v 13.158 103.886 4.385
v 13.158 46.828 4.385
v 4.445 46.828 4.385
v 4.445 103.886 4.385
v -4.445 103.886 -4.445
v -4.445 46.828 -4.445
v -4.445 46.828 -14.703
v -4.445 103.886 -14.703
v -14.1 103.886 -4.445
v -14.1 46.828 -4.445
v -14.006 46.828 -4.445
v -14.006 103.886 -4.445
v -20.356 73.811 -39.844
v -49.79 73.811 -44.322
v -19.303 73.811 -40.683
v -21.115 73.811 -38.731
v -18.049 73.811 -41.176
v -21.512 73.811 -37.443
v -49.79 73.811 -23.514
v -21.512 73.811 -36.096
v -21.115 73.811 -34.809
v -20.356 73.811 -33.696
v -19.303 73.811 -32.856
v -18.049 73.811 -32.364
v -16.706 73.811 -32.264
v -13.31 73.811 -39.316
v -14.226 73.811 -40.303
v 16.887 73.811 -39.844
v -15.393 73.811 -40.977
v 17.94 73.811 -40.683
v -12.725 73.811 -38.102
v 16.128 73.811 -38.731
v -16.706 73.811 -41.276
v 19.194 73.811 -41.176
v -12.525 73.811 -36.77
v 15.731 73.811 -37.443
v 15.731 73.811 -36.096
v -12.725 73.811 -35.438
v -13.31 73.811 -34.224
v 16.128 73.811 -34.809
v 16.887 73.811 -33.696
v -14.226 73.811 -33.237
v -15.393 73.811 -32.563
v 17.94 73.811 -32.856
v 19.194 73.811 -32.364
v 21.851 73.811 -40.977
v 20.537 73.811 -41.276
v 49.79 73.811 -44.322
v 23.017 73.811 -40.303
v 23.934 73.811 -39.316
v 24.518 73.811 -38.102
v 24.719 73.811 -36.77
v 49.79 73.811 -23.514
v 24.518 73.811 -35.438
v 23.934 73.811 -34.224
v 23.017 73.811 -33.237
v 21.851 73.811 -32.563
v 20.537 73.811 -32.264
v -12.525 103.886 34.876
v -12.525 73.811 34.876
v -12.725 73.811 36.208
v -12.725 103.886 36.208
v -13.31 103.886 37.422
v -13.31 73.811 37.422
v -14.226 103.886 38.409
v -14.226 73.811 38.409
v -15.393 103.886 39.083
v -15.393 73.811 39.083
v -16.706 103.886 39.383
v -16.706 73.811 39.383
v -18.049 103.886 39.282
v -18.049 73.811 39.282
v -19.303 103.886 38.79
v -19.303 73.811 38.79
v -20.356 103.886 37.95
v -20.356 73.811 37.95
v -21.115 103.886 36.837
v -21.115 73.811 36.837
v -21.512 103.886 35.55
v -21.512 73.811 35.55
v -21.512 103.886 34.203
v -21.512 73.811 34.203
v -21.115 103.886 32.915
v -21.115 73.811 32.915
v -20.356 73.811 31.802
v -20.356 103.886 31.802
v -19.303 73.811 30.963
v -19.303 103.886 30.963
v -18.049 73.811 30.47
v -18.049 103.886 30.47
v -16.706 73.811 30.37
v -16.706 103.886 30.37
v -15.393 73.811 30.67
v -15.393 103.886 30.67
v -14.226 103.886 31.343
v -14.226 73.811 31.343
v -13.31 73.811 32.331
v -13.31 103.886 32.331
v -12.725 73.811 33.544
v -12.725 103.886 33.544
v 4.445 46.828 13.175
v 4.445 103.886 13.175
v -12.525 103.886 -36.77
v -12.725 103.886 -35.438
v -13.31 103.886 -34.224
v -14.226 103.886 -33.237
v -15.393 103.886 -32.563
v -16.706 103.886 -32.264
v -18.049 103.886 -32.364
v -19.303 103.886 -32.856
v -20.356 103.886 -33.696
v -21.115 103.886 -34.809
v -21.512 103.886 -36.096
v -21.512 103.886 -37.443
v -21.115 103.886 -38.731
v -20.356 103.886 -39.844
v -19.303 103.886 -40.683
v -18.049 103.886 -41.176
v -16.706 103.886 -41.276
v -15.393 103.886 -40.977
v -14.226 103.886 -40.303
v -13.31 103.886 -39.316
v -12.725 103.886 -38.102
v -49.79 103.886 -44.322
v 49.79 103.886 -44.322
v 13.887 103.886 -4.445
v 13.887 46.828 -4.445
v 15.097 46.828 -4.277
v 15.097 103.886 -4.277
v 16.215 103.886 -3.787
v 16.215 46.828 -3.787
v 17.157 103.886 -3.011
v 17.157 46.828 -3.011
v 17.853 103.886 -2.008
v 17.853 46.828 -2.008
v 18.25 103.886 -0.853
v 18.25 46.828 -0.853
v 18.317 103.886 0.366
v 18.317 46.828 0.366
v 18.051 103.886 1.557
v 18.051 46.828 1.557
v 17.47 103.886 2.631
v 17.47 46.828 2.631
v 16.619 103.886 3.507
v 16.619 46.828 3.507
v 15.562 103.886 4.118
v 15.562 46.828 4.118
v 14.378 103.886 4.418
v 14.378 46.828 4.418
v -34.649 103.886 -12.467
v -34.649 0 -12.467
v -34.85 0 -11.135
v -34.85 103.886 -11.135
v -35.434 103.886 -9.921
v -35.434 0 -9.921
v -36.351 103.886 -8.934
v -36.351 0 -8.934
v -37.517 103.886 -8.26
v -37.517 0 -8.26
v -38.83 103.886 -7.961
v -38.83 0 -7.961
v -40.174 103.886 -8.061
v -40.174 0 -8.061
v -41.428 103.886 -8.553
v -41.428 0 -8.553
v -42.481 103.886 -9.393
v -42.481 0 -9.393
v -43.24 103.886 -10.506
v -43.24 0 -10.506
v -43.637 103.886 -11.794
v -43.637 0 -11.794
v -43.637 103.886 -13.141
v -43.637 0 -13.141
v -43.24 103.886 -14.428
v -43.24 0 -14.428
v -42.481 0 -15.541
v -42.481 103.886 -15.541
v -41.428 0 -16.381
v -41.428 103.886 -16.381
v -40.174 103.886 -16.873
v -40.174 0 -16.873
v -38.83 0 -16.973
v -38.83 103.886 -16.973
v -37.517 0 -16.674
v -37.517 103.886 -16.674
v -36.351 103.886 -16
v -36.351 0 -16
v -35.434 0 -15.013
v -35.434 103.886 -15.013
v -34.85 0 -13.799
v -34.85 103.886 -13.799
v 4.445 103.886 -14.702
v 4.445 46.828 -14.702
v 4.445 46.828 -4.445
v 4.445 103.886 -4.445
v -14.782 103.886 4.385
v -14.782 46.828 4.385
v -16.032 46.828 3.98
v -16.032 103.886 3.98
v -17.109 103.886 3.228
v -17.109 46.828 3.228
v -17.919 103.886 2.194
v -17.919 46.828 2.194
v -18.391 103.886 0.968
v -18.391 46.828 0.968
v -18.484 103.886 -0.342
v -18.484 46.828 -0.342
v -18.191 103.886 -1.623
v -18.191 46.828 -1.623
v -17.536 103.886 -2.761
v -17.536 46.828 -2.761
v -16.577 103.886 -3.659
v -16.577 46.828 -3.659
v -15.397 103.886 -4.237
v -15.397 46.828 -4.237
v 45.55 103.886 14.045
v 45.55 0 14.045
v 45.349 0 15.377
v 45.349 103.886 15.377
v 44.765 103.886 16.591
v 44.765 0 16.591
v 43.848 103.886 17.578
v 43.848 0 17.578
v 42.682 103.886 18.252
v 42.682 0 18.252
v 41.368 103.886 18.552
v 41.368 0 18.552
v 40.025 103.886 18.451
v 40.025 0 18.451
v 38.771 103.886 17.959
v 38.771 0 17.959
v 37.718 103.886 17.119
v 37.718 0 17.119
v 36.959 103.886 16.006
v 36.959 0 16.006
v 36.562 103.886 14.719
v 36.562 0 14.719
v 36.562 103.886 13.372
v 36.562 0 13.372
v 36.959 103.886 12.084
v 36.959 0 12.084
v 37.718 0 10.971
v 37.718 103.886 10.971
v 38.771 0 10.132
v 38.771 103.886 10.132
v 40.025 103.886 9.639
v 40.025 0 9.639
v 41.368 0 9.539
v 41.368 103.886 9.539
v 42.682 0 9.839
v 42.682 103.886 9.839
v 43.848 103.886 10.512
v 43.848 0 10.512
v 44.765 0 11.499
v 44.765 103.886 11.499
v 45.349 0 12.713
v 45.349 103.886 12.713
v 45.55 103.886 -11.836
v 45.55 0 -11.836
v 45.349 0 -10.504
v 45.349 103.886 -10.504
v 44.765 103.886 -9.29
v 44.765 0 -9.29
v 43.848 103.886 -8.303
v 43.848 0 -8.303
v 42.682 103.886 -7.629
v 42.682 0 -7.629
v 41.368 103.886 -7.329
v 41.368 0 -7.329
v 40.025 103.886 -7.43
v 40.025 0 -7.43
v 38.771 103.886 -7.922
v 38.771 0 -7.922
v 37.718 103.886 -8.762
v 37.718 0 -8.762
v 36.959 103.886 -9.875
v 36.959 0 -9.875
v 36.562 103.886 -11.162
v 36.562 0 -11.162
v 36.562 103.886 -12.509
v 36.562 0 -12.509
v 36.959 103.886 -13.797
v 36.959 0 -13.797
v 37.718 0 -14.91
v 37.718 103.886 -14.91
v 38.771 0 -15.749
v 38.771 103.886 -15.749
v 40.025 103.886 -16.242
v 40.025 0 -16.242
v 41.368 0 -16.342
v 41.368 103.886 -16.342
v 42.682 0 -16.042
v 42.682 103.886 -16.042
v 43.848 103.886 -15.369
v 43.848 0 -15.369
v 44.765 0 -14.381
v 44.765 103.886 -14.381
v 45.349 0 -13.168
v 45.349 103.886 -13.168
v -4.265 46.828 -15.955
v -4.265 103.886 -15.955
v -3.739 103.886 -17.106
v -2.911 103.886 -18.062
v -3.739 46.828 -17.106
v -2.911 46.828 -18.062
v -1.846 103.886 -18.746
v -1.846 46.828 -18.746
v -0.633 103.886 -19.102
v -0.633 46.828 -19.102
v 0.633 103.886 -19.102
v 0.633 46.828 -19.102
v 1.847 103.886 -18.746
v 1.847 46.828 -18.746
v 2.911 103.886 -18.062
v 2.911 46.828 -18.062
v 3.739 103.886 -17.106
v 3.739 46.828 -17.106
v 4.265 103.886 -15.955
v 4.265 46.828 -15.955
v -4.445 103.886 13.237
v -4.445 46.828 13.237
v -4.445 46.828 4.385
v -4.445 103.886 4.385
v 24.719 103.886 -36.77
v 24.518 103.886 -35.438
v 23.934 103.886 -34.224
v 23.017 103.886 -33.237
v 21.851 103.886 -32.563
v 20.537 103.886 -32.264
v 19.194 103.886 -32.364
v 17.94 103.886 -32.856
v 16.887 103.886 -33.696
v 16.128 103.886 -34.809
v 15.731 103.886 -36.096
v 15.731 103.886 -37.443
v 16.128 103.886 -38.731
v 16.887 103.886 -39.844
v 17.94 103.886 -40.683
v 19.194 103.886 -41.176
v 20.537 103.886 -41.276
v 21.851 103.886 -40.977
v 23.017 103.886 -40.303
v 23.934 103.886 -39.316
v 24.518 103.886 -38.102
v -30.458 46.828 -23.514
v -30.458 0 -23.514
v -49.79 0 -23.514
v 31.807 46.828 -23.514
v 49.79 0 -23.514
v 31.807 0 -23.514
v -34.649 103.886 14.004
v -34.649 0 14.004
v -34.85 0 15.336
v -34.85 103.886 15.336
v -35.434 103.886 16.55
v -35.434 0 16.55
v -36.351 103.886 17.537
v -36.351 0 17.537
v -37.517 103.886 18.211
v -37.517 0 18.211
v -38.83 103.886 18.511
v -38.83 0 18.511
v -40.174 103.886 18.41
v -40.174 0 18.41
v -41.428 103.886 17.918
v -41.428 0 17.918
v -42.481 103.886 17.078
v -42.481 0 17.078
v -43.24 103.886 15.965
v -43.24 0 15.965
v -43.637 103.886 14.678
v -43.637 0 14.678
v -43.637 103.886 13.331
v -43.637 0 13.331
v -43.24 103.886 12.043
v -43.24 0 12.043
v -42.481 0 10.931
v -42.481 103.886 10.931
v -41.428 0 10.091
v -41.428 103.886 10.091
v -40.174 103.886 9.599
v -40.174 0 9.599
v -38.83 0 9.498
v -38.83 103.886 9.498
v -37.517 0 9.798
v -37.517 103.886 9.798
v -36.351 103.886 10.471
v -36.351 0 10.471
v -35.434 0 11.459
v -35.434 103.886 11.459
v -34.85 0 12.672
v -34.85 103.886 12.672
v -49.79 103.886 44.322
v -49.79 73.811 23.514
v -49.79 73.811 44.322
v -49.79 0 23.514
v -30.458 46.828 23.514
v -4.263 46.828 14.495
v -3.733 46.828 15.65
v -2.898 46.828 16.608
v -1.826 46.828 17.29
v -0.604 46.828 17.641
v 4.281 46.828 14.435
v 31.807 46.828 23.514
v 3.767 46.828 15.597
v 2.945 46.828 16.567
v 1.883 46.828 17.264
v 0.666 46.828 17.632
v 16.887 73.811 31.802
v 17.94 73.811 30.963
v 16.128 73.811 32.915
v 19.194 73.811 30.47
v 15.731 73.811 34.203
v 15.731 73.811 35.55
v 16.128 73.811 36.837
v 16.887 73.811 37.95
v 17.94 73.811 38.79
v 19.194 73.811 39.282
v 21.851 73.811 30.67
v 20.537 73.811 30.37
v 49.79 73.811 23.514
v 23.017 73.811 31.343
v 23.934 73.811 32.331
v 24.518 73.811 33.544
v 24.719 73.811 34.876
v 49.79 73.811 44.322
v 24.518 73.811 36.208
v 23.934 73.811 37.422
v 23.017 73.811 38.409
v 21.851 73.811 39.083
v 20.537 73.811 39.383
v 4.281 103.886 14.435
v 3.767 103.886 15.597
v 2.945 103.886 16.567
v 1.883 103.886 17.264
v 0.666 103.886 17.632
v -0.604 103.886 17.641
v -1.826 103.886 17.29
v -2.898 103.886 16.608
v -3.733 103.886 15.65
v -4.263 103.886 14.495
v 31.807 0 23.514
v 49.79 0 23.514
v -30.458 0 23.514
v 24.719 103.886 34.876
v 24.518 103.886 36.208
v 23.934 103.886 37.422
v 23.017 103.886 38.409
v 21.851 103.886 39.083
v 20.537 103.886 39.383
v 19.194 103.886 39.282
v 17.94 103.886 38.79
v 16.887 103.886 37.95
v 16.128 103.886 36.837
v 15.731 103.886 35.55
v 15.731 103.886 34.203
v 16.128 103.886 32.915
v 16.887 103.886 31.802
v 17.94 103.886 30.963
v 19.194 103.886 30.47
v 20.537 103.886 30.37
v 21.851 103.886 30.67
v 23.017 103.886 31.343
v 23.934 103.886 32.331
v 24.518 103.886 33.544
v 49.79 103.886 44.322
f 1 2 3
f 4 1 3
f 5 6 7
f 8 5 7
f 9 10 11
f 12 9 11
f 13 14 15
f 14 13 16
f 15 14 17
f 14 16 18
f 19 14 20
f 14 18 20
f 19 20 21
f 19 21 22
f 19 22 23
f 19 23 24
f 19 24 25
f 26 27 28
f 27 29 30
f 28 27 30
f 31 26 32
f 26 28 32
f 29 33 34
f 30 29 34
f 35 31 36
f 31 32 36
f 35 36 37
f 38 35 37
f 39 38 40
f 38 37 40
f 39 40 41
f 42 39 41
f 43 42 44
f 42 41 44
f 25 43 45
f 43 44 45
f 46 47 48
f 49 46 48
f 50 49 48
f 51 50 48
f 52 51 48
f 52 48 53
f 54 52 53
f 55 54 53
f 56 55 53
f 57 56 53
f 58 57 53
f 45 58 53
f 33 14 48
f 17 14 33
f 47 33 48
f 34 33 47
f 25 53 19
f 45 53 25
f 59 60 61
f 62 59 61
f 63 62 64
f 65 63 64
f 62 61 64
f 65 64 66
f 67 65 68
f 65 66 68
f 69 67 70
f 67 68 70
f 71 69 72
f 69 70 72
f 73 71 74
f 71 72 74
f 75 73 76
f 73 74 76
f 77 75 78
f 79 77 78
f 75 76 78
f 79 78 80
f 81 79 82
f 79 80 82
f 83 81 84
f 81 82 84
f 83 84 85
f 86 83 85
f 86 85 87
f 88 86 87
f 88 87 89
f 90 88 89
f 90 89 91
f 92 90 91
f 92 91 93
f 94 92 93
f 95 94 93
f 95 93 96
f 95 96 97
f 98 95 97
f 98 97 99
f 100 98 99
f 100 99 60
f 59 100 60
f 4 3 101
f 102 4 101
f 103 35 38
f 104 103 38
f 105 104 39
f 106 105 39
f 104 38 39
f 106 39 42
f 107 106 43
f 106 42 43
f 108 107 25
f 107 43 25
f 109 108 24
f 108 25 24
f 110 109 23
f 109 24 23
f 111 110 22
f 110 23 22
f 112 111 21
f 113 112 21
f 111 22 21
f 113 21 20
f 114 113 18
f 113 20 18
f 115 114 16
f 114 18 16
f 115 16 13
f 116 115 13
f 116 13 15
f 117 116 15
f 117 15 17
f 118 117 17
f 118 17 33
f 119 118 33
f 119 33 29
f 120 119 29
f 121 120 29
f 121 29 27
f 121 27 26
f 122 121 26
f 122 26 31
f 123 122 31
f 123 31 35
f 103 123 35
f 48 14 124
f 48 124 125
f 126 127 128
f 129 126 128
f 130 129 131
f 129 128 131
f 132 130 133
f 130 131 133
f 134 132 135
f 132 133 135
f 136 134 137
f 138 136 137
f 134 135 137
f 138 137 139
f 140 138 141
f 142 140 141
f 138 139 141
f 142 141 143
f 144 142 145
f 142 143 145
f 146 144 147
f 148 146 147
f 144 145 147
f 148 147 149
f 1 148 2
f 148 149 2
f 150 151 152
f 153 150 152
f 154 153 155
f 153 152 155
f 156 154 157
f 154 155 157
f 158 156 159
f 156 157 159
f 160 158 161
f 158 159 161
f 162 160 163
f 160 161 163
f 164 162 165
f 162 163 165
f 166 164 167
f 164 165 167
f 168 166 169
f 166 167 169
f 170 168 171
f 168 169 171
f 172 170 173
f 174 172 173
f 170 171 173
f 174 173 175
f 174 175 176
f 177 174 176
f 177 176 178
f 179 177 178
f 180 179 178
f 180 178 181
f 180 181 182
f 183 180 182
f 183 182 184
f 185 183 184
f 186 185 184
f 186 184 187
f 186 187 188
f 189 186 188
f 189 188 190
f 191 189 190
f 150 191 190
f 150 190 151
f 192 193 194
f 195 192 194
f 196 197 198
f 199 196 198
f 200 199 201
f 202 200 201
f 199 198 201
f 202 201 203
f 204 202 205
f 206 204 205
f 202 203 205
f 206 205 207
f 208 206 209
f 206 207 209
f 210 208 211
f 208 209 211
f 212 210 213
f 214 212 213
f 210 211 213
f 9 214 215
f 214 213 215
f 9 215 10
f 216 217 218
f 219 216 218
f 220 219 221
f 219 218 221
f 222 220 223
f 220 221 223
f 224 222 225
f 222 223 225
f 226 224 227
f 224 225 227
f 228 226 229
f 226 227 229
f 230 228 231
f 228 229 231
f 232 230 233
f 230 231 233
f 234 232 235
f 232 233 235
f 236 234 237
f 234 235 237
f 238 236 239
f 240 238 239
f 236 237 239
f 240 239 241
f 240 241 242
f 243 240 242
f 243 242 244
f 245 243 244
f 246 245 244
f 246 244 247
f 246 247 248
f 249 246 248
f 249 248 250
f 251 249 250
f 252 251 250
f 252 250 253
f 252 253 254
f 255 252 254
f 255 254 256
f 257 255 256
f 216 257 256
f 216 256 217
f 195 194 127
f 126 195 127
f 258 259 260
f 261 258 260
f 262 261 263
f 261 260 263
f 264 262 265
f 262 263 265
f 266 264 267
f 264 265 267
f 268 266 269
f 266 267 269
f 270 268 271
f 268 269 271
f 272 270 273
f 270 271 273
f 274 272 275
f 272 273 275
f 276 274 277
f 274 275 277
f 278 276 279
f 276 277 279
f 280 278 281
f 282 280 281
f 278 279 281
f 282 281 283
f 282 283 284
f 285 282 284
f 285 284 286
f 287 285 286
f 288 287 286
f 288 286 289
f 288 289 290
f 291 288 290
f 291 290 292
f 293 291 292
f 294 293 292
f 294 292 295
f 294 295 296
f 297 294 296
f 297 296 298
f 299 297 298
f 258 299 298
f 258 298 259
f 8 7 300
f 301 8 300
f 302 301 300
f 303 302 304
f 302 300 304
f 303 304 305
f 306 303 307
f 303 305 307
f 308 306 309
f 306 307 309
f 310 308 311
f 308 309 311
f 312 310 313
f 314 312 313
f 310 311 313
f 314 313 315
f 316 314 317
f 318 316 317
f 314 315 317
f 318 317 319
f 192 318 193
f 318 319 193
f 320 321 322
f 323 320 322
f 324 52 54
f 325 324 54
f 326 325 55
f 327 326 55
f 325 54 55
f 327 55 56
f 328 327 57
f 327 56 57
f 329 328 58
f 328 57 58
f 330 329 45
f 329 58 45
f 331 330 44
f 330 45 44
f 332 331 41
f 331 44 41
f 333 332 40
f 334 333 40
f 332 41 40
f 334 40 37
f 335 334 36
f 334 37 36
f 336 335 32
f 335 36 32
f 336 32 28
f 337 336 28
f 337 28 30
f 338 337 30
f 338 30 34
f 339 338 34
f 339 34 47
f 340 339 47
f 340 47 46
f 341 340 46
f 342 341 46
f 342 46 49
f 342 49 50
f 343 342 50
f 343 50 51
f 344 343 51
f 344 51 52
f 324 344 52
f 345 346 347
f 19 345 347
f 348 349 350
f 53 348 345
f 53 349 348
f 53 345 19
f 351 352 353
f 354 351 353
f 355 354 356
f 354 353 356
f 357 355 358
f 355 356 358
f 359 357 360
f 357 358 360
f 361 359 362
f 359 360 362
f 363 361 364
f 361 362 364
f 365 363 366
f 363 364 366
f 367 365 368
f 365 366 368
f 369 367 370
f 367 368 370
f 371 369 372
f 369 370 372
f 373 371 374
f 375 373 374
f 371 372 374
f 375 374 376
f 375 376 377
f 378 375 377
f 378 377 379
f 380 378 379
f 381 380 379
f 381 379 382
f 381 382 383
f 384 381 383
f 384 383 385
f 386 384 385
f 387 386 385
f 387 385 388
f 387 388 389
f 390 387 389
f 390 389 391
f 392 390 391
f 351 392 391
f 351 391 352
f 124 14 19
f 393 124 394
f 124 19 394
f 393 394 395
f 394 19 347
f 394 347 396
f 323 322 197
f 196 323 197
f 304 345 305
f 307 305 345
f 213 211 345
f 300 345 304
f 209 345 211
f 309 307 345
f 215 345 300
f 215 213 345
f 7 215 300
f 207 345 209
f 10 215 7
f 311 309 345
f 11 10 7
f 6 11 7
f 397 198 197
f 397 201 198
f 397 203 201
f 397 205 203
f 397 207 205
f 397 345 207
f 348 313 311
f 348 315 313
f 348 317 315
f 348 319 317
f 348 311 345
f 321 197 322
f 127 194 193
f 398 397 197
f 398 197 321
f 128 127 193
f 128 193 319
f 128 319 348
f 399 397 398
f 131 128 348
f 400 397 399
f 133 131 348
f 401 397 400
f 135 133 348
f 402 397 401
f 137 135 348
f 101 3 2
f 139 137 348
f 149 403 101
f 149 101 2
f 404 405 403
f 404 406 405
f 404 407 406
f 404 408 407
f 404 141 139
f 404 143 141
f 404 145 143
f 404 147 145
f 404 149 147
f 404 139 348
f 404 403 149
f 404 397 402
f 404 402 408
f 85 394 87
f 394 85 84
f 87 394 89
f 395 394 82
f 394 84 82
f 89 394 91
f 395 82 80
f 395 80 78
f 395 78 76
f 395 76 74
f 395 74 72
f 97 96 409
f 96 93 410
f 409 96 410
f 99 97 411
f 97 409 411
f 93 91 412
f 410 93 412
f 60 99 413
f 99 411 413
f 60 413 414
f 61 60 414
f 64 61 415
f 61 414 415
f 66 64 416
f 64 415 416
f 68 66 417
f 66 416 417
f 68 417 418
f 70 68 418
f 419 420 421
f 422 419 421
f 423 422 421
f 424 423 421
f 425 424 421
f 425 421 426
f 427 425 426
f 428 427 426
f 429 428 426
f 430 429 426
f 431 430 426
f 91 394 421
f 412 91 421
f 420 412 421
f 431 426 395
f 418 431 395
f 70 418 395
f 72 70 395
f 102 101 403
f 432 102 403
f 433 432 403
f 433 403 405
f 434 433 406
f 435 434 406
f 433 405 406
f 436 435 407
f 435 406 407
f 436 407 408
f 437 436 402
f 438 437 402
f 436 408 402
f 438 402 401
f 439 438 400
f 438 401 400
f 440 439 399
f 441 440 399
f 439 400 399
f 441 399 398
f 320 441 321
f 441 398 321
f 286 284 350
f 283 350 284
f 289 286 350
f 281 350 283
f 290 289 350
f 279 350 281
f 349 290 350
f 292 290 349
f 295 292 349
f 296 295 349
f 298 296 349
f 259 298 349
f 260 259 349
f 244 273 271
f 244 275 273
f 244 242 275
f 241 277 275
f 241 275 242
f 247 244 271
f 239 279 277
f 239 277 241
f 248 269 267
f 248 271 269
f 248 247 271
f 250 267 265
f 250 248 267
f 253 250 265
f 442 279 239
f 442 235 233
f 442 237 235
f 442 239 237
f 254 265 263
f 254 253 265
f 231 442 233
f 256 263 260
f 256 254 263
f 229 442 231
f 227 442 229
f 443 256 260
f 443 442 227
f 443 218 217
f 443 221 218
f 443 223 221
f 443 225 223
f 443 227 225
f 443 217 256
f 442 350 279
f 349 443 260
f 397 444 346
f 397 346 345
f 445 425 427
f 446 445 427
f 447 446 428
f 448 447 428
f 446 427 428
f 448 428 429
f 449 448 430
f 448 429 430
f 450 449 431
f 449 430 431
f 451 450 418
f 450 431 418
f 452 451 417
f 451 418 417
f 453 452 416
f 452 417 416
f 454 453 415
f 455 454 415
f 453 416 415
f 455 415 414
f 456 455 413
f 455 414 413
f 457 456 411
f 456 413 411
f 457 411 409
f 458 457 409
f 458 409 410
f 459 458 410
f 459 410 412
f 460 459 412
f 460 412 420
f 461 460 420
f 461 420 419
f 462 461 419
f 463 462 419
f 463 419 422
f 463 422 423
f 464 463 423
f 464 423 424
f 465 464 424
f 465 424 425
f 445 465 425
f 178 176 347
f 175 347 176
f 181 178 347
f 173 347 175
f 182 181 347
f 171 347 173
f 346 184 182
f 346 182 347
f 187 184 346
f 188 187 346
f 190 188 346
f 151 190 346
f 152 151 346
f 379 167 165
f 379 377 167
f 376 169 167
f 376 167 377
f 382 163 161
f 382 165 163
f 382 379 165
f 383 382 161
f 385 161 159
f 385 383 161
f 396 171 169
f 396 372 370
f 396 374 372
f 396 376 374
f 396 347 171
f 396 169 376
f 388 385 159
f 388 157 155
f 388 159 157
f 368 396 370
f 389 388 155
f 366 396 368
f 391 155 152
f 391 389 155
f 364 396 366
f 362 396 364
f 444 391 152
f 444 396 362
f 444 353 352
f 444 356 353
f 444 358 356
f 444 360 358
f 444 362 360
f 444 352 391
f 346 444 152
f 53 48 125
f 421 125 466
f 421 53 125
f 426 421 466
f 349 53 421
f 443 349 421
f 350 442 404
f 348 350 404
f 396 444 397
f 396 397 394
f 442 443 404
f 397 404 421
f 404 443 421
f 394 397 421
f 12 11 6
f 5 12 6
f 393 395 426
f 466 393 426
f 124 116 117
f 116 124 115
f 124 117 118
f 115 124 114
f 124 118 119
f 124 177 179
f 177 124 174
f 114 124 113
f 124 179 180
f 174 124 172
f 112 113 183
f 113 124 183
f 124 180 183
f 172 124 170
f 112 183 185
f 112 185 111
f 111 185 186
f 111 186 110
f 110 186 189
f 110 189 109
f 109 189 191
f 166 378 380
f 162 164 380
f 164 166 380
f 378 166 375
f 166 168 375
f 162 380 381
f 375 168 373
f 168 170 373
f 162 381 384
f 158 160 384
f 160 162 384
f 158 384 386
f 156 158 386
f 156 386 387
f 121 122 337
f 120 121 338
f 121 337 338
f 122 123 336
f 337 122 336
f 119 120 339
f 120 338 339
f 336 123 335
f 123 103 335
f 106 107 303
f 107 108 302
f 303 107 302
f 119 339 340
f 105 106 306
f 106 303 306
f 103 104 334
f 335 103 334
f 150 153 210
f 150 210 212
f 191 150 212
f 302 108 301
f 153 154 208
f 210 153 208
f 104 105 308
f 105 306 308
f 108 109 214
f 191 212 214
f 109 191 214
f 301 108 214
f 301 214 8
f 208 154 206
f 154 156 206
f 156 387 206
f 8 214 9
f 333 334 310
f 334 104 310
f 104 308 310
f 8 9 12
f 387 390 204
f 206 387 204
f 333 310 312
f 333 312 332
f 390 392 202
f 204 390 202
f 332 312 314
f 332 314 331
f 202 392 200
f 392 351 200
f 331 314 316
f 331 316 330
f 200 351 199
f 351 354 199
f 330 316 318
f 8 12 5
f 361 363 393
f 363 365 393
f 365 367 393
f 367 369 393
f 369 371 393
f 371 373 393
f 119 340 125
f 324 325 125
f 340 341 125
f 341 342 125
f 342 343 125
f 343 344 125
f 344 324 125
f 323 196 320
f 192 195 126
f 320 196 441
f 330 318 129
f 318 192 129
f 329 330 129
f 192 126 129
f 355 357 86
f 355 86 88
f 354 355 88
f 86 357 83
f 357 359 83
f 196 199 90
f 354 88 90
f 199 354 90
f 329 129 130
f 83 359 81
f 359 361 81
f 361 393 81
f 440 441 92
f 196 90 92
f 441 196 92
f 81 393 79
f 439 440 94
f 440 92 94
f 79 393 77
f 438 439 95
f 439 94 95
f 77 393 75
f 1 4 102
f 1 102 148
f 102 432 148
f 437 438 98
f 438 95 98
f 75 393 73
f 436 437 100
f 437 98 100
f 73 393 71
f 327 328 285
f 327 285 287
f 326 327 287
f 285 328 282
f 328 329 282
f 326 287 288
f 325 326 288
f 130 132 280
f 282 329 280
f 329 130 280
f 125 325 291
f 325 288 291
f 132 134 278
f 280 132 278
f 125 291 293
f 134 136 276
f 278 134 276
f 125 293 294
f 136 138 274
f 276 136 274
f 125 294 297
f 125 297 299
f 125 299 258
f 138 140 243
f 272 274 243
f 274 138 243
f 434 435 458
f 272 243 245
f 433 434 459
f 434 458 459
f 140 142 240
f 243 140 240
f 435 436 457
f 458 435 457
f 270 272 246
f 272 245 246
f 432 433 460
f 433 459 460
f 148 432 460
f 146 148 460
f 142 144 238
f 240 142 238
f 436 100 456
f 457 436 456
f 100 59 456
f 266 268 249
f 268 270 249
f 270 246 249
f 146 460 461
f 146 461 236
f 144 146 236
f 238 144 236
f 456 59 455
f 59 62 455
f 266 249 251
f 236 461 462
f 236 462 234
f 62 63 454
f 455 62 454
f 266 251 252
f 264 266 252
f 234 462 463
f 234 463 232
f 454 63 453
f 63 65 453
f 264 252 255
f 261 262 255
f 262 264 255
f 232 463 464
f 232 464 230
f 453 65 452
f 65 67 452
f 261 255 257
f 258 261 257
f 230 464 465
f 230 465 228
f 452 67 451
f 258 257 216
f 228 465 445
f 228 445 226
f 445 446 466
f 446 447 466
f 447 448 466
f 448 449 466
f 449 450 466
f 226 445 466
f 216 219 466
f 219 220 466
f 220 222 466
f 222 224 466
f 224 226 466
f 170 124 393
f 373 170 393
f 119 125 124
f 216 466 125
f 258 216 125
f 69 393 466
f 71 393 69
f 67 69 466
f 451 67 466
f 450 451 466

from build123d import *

# Parameters (mm, degrees)
F0_W     = 99.5807871222
F0_H     = 88.644169271
F1_DEPTH = 103.886
F2_W     = 73.8110467792
F2_H     = 20.8082981408
F3_DEPTH = 202.184
F4_R     = 4.5190102714
F5_DEPTH = 183.388
F6_W     = 62.2652955353
F6_H     = 46.8279197812
F7_DEPTH = 52.07
F9_DEPTH = 124.46


with BuildPart() as f1:
    # F0 (on Front) → F1 (new body)
    with BuildSketch(Plane.XZ):
        Rectangle(F0_W, F0_H)
    extrude(amount=-F1_DEPTH)

    # F2 (on face) → F3 (cut)
    with BuildSketch(Plane.YZ.offset(49.7903935611)):
        with Locations((36.9055233896, 33.9179355651)):
            Rectangle(F2_W, F2_H)
        with Locations((36.9055233896, -33.9179355651)):
            Rectangle(F2_W, F2_H)
    extrude(amount=-F3_DEPTH, mode=Mode.SUBTRACT)

    # F4 (on Front) → F5 (cut)
    with BuildSketch(Plane.XZ):
        with Locations((-17.0435514301, 34.876152873)):
            Circle(F4_R)
        with Locations((20.1997645199, 34.876152873)):
            Circle(F4_R)
        with Locations((-17.0435514301, -36.7698818445)):
            Circle(F4_R)
        with Locations((20.1997645199, -36.7698818445)):
            Circle(F4_R)
        with Locations((-39.168164134, 14.0042221174)):
            Circle(F4_R)
        with Locations((-39.168164134, -12.4670416117)):
            Circle(F4_R)
        with Locations((41.0307683051, 14.0451472253)):
            Circle(F4_R)
        with Locations((41.0307683051, -11.8357995525)):
            Circle(F4_R)
    extrude(amount=-F5_DEPTH, mode=Mode.SUBTRACT)

    # F6 (on face) → F7 (cut)
    with BuildSketch(Plane.XY.offset(23.5137864947)):
        with Locations((0.6743837148, 23.4139598906)):
            Rectangle(F6_W, F6_H)
    extrude(amount=-F7_DEPTH, mode=Mode.SUBTRACT)

    # F8 (on face) → F9 (cut)
    with BuildSketch(Plane.XZ.offset(-46.8279197812)):
        with BuildLine():
            Line((-4.445, 4.3847536734), (-14.7820186248, 4.3847536734))
            ThreePointArc((-14.7820186248, 4.3847536734), (-18.4844560039, -0.342391801), (-14.0998682729, -4.4447493319))
            Line((-14.0998682729, -4.4447493319), (-14.0055365282, -4.4447501768))
            Line((-14.0055365282, -4.4447501768), (-4.445, -4.444835806))
            Line((-4.445, -4.444835806), (-4.445, -14.7025363844))
            ThreePointArc((-4.445, -14.7025363844), (3.51265e-05, -19.1475363843), (4.4449999994, -14.7024661314))
            Line((4.4449999994, -14.7024661314), (4.4448378792, -4.4449154281))
            Line((4.4448378792, -4.4449154281), (13.8872975972, -4.4449999998))
            ThreePointArc((13.8872975972, -4.4449999998), (18.3172518615, 0.3659001816), (13.1579813752, 4.3847536734))
            Line((13.1579813752, 4.3847536734), (4.4446983265, 4.3847536734))
            Line((4.4446983265, 4.3847536734), (4.4445593988, 13.1748796689))
            ThreePointArc((4.4445593988, 13.1748796689), (0.0312927488, 17.6823534639), (-4.445, 13.2374636156))
            Line((-4.445, 13.2374636156), (-4.445, 4.3847536734))
        make_face()
    extrude(amount=-F9_DEPTH, mode=Mode.SUBTRACT)


solid = f1.part
